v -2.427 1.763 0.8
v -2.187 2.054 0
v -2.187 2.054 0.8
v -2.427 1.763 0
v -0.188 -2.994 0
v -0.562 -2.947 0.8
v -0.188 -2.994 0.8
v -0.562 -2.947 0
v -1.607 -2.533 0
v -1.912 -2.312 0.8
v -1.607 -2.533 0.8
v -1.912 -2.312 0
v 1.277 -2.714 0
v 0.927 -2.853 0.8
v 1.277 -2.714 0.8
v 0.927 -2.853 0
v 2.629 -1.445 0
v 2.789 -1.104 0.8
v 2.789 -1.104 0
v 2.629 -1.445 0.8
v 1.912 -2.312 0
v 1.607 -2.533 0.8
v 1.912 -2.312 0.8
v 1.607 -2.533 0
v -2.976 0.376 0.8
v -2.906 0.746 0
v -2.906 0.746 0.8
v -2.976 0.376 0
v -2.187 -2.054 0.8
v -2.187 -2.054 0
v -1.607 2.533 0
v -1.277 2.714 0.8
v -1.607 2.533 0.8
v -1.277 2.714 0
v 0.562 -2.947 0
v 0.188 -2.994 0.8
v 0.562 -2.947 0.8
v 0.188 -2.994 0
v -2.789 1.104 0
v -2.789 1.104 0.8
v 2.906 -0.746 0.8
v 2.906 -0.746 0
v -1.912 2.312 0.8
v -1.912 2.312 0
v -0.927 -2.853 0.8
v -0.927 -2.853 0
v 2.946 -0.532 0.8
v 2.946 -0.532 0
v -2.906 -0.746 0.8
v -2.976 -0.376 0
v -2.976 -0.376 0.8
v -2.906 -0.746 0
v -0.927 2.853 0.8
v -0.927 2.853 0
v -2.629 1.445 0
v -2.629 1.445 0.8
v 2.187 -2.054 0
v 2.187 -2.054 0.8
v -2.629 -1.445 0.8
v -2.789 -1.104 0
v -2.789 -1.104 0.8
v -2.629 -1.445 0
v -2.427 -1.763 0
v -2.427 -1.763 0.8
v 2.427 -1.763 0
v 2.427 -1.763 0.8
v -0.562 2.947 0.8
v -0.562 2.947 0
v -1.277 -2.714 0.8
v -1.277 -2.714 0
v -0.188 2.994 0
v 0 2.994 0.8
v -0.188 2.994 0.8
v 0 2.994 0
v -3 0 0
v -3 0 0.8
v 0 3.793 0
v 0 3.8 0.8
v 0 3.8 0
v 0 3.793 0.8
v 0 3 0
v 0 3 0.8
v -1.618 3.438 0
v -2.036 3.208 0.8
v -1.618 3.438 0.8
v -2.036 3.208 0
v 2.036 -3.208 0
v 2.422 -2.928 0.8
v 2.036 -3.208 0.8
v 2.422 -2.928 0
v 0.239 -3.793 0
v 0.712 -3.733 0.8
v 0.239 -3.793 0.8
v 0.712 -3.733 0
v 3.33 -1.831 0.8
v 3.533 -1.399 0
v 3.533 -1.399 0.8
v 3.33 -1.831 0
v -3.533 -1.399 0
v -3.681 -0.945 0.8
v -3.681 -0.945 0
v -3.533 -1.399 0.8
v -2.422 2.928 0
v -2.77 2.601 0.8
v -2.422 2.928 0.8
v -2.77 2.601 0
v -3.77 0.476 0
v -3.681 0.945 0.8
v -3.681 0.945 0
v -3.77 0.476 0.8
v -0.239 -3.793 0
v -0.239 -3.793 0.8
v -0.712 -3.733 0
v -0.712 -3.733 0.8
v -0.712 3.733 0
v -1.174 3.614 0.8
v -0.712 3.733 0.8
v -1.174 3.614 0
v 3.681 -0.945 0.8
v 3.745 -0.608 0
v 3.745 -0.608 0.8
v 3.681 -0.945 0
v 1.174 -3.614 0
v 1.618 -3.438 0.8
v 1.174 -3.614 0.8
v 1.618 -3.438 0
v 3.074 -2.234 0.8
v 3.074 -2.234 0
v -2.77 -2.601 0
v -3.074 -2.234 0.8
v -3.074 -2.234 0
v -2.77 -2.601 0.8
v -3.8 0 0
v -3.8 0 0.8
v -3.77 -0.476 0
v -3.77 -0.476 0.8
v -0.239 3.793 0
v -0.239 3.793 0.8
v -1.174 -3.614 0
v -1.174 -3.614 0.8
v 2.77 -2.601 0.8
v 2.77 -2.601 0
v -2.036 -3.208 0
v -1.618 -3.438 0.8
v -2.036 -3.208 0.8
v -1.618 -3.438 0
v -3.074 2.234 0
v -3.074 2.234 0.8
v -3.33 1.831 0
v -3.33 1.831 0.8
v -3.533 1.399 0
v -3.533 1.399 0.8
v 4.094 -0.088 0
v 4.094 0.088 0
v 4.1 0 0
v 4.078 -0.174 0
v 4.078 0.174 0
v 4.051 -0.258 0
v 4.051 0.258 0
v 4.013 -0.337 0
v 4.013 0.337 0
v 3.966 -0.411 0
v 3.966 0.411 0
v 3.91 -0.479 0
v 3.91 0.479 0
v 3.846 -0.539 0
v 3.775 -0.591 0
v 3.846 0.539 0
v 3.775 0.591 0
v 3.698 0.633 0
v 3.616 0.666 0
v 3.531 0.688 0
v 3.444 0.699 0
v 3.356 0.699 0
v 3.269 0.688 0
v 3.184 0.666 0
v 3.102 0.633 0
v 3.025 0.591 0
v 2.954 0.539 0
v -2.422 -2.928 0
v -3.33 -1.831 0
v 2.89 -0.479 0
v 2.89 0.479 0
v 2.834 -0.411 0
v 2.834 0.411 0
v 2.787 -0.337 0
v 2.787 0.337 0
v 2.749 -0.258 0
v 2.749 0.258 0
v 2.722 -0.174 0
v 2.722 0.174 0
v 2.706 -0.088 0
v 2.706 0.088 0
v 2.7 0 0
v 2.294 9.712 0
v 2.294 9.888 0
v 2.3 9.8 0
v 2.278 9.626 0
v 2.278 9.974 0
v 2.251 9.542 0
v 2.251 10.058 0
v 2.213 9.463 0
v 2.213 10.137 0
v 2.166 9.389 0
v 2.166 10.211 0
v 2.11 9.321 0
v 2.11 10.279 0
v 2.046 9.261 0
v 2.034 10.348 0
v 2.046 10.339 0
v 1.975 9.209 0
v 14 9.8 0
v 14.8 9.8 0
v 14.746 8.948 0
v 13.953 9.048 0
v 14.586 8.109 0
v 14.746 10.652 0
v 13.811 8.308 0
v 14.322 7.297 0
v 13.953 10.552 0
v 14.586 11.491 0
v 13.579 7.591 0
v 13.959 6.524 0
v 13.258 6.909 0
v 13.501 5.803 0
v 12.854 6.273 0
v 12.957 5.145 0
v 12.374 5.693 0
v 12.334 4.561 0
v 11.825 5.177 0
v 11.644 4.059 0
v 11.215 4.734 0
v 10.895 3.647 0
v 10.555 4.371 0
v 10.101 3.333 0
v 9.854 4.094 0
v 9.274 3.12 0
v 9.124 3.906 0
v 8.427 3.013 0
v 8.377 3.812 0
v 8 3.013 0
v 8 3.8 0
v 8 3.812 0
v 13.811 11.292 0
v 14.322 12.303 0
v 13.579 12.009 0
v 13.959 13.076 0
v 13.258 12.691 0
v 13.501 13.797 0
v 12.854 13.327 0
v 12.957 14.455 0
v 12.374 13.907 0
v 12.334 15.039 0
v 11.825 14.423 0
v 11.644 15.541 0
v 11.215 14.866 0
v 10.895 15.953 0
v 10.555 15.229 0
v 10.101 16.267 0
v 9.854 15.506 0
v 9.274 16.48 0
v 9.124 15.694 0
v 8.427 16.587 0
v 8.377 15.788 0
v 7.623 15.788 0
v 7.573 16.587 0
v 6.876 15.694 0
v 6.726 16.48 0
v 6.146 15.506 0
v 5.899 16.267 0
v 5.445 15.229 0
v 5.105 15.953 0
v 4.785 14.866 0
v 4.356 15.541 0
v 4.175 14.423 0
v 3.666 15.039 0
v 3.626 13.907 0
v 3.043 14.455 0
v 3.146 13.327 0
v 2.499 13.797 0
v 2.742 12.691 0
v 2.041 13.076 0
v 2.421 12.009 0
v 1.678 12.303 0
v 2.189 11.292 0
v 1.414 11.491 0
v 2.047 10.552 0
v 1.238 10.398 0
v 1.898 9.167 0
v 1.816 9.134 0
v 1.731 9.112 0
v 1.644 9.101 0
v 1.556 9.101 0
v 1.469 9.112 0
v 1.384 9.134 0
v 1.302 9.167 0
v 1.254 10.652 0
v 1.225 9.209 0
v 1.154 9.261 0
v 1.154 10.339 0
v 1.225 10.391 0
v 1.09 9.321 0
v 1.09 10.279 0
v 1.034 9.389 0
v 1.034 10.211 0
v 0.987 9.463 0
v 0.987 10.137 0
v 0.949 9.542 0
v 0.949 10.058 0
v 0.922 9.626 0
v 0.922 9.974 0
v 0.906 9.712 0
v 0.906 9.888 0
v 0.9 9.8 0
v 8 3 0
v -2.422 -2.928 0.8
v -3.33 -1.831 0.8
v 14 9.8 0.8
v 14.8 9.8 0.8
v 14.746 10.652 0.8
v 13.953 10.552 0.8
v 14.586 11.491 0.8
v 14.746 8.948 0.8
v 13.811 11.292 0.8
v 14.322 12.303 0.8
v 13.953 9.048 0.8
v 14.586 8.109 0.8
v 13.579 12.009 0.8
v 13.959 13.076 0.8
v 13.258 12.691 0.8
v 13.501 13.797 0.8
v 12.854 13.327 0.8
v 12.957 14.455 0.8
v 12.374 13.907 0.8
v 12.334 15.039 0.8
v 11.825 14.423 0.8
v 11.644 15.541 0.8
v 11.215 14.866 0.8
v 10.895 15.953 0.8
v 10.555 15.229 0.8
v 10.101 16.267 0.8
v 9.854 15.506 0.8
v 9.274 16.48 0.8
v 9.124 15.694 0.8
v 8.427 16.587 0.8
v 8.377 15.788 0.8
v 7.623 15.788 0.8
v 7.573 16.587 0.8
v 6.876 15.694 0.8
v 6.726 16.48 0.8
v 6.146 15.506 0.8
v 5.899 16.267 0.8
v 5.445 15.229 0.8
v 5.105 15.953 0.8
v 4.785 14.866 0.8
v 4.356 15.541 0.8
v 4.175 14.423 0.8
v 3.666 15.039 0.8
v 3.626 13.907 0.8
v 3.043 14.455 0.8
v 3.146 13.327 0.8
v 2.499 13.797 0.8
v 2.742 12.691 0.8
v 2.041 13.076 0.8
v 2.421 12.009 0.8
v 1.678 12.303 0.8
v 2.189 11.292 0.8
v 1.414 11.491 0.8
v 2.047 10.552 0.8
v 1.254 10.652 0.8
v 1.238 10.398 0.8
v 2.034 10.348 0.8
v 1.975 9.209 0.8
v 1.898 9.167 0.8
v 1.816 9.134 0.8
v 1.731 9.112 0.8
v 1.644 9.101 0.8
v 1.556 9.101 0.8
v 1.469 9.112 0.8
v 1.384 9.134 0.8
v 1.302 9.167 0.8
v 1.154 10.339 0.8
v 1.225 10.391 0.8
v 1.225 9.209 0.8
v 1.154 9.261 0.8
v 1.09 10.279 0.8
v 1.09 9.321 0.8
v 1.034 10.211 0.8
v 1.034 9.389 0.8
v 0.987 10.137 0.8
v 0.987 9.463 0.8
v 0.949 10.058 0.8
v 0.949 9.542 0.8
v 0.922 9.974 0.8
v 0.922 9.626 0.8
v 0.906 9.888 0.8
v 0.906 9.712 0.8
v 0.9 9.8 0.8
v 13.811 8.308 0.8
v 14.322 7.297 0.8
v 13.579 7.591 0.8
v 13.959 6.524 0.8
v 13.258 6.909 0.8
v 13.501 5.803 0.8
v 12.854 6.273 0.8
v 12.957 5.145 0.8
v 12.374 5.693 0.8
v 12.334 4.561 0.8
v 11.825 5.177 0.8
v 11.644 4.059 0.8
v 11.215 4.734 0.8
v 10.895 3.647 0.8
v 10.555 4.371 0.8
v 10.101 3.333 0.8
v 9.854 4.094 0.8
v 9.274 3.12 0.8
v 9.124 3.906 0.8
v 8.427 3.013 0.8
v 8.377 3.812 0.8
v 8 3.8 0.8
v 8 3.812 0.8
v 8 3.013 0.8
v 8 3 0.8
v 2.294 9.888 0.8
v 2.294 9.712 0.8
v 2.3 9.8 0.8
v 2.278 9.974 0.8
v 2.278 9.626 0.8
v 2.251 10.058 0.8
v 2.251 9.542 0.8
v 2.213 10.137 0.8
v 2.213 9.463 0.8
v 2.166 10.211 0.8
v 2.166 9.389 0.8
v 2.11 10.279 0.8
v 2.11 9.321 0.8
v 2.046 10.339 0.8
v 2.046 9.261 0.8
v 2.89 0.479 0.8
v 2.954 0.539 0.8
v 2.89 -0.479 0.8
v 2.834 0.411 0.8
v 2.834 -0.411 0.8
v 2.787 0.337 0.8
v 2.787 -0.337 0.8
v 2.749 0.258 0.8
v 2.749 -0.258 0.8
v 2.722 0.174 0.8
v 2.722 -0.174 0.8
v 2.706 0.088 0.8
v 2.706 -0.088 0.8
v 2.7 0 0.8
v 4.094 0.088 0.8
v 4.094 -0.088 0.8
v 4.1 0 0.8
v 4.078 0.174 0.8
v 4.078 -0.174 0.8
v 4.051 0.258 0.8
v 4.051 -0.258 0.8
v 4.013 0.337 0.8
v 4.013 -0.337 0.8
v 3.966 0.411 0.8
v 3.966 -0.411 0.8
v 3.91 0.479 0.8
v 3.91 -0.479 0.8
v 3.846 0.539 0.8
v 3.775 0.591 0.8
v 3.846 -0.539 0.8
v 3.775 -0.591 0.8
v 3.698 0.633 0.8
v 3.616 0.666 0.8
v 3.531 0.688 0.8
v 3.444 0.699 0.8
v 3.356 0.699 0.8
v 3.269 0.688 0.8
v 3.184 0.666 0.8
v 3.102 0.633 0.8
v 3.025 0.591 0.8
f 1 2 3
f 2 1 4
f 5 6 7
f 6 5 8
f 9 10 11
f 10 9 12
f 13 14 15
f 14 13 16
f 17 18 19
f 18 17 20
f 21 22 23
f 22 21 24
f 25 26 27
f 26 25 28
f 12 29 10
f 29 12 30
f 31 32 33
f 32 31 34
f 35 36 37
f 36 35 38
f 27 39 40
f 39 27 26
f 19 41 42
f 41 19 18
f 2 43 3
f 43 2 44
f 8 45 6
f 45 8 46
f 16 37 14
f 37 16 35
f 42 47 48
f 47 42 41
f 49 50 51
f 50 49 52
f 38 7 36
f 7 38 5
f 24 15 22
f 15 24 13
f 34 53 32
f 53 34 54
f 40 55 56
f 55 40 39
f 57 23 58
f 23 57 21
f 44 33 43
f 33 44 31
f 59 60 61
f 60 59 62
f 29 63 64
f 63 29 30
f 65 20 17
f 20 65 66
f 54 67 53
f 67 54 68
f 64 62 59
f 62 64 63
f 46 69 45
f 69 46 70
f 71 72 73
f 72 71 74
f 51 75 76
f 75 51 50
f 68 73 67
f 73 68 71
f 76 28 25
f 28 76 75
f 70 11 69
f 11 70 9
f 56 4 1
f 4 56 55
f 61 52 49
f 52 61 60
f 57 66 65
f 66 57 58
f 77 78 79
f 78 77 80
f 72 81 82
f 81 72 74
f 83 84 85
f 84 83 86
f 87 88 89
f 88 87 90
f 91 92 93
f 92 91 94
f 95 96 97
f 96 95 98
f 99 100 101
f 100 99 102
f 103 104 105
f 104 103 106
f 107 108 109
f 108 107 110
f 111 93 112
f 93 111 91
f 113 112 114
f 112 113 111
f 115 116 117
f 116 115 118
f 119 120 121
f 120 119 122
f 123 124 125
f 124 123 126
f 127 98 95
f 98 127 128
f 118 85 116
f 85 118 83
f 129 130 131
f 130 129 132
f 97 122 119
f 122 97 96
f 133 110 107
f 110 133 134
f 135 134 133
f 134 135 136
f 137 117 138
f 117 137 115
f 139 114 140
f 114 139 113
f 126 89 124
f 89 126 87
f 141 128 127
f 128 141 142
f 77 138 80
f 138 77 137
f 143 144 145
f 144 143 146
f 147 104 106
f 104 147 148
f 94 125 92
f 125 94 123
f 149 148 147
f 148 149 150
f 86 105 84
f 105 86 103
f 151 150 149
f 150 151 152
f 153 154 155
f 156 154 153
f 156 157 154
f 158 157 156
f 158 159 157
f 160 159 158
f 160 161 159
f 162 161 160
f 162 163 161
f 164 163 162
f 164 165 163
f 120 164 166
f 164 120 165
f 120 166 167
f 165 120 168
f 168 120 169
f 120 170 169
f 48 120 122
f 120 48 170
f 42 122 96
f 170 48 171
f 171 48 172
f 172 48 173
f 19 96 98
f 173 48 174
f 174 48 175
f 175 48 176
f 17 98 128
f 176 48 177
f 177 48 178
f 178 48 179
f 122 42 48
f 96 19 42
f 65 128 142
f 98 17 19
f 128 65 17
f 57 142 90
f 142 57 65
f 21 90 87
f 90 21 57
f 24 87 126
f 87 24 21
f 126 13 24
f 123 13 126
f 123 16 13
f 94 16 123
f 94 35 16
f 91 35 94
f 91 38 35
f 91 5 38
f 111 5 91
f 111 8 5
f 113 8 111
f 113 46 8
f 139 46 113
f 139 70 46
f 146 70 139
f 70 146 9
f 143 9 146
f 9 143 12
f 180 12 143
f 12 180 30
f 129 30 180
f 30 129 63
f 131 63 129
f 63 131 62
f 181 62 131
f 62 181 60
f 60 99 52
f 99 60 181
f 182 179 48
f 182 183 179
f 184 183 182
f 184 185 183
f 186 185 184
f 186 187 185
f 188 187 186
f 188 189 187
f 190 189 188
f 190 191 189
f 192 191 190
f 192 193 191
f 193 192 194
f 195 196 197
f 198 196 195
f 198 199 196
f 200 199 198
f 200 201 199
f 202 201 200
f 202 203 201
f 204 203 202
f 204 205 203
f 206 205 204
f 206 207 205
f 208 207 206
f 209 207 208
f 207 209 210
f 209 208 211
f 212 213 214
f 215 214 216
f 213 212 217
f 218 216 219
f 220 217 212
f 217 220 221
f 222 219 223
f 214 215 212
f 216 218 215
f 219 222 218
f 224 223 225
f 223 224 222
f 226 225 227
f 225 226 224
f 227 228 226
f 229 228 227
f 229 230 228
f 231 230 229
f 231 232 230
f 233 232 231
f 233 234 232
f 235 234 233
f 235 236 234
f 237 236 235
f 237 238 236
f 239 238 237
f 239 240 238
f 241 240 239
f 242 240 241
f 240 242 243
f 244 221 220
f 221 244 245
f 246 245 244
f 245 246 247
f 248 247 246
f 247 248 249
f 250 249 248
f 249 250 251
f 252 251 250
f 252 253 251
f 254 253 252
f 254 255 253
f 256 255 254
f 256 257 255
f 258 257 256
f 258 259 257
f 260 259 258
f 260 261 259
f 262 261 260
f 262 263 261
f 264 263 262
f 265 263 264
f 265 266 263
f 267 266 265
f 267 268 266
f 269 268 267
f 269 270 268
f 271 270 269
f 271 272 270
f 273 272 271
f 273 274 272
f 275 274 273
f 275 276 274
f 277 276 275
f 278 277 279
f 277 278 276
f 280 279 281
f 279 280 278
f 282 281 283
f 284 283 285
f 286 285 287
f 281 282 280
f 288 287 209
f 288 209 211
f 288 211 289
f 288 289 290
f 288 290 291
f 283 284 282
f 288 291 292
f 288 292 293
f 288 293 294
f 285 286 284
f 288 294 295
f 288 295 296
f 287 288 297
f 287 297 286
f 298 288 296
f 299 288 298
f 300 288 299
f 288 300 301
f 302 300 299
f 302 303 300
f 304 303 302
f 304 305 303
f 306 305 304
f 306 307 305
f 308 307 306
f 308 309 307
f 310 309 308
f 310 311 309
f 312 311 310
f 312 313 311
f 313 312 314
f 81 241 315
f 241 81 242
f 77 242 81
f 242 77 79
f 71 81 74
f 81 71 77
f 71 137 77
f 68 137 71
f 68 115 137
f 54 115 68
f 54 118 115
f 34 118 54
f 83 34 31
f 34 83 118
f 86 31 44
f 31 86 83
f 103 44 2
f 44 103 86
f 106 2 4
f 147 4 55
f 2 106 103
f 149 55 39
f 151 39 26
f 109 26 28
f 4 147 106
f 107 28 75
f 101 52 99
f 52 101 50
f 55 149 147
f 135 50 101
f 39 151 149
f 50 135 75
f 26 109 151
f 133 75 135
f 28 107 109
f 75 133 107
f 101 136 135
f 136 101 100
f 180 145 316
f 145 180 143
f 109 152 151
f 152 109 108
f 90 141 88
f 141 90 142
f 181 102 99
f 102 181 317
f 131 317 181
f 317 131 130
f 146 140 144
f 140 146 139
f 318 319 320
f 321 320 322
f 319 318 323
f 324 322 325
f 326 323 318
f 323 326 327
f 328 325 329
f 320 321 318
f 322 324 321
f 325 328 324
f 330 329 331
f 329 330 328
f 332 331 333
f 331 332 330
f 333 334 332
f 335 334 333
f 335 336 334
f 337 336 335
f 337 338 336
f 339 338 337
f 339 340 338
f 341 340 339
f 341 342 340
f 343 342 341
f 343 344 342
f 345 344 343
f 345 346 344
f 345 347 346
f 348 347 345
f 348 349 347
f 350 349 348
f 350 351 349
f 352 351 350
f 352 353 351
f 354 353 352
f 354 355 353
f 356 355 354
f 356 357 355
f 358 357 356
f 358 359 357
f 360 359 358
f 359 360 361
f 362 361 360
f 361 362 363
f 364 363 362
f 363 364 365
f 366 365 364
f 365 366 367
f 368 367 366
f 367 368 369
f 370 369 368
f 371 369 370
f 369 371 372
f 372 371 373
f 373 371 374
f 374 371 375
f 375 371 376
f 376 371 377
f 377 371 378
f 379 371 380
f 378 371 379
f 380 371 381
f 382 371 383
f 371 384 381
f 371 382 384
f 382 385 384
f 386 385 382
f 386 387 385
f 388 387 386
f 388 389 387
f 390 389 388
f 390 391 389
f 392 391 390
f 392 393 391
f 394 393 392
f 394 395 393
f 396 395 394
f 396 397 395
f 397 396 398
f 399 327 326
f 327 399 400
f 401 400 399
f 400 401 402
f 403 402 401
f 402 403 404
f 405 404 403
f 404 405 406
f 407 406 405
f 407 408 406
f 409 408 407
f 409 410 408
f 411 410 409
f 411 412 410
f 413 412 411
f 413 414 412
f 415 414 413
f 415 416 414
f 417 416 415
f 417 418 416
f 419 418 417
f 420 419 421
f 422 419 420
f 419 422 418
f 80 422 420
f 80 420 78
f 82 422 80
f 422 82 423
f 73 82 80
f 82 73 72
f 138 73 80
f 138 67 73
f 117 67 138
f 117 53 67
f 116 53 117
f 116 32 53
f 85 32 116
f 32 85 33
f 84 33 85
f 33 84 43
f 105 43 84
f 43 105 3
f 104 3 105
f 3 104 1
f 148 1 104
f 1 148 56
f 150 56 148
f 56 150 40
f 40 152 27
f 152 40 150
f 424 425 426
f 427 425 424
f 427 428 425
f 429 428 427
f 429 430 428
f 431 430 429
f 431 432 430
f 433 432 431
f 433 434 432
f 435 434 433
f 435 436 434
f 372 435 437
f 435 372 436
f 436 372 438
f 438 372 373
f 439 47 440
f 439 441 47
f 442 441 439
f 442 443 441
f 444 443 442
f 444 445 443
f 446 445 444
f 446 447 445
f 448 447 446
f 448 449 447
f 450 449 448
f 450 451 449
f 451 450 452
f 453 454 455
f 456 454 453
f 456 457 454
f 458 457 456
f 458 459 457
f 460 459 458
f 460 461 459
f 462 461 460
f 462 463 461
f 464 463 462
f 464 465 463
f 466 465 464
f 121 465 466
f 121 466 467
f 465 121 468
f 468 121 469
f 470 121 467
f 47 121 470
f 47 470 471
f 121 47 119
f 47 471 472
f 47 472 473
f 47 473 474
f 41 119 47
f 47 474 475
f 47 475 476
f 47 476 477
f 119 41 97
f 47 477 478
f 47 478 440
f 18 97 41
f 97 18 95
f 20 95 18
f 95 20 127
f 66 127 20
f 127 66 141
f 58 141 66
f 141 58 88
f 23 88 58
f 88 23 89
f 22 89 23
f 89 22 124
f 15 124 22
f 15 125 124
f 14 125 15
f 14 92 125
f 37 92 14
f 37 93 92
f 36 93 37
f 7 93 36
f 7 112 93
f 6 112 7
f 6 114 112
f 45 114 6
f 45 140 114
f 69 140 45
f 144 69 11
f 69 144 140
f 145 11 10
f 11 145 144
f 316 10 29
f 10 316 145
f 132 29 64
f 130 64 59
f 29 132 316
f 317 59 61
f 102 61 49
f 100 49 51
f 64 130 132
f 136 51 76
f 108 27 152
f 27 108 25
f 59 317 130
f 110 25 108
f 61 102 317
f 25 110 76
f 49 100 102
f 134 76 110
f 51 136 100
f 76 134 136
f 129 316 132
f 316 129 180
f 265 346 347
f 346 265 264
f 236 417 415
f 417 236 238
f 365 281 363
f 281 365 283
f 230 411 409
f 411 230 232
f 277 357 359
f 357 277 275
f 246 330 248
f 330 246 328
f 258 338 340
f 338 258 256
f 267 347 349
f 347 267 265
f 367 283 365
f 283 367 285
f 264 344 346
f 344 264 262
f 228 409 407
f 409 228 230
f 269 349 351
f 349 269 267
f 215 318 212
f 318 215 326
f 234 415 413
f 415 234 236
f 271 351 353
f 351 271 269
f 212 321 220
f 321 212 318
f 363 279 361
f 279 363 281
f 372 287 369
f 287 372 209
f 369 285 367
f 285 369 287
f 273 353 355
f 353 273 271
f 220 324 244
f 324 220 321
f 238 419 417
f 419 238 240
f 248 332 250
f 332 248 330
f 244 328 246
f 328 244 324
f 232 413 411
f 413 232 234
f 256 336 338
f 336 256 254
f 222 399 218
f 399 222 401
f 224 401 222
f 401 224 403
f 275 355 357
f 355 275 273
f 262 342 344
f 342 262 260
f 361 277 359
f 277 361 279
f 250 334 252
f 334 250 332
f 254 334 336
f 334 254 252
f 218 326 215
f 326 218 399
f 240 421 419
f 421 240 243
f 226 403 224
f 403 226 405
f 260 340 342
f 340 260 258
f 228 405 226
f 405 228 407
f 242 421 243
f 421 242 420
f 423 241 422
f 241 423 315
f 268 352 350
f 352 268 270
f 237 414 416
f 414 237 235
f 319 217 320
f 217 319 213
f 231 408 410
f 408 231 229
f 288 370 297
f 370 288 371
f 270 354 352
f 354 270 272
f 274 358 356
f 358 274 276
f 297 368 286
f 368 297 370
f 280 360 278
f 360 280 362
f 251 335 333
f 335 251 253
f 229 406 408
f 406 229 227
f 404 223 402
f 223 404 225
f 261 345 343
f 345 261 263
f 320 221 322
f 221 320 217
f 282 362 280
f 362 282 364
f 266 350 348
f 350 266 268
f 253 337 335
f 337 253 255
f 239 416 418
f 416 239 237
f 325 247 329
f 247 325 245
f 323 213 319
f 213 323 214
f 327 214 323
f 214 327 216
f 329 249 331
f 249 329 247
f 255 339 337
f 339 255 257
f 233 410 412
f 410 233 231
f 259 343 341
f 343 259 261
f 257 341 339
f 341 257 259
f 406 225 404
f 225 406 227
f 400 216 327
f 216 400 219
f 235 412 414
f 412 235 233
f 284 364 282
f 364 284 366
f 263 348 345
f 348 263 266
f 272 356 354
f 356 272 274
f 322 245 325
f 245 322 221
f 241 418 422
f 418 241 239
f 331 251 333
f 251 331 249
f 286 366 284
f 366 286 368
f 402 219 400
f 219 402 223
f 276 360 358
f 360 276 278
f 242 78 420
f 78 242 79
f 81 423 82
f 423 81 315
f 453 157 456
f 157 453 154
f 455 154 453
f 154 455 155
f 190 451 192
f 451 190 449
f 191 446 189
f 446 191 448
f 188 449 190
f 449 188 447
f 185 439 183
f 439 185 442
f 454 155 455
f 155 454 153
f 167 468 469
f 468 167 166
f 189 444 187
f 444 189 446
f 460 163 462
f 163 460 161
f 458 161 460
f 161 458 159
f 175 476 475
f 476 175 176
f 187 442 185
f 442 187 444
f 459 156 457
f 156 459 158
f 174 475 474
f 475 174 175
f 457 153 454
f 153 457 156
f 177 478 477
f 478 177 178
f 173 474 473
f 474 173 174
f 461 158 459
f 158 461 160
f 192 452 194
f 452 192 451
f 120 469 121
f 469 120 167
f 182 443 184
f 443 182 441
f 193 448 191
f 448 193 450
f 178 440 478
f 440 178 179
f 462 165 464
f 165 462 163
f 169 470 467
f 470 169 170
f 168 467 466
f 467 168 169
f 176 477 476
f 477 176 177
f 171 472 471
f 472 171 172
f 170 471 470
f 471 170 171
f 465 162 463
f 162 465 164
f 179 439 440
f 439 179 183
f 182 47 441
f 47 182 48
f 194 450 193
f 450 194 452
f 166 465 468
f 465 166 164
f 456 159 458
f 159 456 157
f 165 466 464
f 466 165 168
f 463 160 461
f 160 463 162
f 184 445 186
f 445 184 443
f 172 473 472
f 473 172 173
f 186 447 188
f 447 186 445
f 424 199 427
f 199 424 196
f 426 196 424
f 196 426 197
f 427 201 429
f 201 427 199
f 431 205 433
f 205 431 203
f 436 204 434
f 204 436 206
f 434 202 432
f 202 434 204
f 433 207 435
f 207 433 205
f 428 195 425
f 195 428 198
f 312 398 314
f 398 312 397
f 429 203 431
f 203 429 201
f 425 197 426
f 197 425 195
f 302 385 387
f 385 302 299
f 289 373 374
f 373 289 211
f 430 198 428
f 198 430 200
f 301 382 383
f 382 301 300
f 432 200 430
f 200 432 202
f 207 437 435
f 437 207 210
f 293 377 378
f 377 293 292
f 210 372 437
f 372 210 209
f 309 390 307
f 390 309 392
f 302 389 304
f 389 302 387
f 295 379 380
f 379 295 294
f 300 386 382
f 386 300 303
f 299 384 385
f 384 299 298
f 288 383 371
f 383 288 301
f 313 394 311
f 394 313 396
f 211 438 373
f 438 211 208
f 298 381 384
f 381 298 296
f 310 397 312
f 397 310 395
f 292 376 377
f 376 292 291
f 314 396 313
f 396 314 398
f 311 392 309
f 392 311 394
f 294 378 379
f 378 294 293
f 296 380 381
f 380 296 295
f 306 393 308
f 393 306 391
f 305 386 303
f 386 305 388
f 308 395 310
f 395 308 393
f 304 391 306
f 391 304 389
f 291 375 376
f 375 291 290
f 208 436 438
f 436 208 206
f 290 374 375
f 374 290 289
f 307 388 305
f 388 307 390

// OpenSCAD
/* [Hook] */

// Diameter of the small part of the hook
d1 = 6;   // [1:0.5:20]
// Diameter of the large part of the hook
d2 = 12;  // [5:1:50]
// Height of the hook
h = 0.8;  // [0.1:0.1:2]
// Width of the hook
w = 0.8;  // [0.1:0.1:1]
// Length of the connection between the two part of the hook
l = 8;    // [0:1:50]
// Extra size of the ends of the hook
x = 0.6;  // [0:0.1:5]

/* [Hidden] */

epsilon = 0.001;
$fn = 50;

module cylinder_3_4th(d, h, w) {
  difference() {
    cylinder(h, d = d+2*w);
    translate([0, 0, -epsilon]) {
      cylinder(h + 2 * epsilon, d = d);
      cube([d/2+w+epsilon, d/2+w+epsilon, h+2*epsilon]);
    }
  }
}

cylinder_3_4th(d1, h, w);
translate([l, (d1+d2)/2 + w, 0])
  rotate([0, 0, 180])
    cylinder_3_4th(d2, h, w);
translate([0, d1 / 2, 0])
  cube([l,w,h]);
translate([(d1 + w) / 2, 0, 0])
  cylinder(h, d = w + x);
translate([l - (d2 + w) / 2, (d1 + d2) / 2 + w, 0])
  cylinder(h, d = w + x);
